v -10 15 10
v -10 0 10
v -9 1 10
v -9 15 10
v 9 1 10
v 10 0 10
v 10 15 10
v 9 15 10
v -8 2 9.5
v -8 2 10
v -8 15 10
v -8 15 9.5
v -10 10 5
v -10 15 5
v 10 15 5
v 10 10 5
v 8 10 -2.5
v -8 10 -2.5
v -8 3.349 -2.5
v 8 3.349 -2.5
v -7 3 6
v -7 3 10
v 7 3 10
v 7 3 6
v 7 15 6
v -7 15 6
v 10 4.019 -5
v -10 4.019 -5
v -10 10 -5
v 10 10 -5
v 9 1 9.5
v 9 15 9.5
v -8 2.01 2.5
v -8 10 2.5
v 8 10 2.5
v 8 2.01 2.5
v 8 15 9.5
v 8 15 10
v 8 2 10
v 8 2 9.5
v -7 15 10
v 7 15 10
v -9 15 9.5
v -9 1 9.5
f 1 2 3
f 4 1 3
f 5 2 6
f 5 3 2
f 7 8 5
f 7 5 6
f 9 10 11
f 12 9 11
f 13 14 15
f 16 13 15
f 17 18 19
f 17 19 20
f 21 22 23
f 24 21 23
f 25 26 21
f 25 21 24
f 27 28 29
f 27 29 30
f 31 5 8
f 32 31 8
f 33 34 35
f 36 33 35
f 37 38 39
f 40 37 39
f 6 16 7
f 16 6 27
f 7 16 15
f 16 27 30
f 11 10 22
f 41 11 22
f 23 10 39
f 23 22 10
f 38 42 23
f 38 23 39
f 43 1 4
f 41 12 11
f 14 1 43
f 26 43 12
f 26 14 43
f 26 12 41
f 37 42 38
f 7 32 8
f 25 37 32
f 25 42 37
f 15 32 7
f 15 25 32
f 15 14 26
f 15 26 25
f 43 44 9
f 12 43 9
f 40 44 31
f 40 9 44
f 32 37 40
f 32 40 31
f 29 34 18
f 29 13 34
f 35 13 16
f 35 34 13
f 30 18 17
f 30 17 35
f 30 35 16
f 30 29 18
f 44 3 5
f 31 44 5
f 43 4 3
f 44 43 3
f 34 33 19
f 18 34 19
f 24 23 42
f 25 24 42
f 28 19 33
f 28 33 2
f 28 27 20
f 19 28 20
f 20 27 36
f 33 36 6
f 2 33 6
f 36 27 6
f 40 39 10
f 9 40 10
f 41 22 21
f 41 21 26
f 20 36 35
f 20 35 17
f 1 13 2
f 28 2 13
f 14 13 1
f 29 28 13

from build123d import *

# Parameters (mm, degrees)
SKETCH1_W           = 20
SKETCH1_H           = 10
BOSS_EXTRUDE1_DEPTH = 10
SKETCH2_W           = 16
SKETCH2_H           = 5
CUT_EXTRUDE1_DEPTH  = 11
SKETCH3_W           = 20
SKETCH3_H           = 15
BOSS_EXTRUDE2_DEPTH = 5
SKETCH4_W           = 14
SKETCH4_H           = 12
CUT_EXTRUDE2_DEPTH  = 4
CUT_EXTRUDE3_DEPTH  = 0.5
CUT_EXTRUDE4_DEPTH  = 21


with BuildPart() as part:
    # Sketch1 → Boss-Extrude1 (new body)
    with BuildSketch(Plane(origin=(0, 0, 0), x_dir=(1, 0, 0), z_dir=(0, 1, 0))):
        Rectangle(SKETCH1_W, SKETCH1_H)
    extrude(amount=BOSS_EXTRUDE1_DEPTH)

    # Sketch2 → Cut-Extrude1 (cut, through all)
    with BuildSketch(Plane(origin=(0, 10, 0), x_dir=(1, 0, 0), z_dir=(0, 1, 0))):
        Rectangle(SKETCH2_W, SKETCH2_H)
    extrude(amount=-CUT_EXTRUDE1_DEPTH, mode=Mode.SUBTRACT)

    # Sketch3 → Boss-Extrude2 (add)
    with BuildSketch(Plane.XY.offset(5)):
        with Locations((0, 7.5)):
            Rectangle(SKETCH3_W, SKETCH3_H)
    extrude(amount=BOSS_EXTRUDE2_DEPTH)

    # Sketch4 → Cut-Extrude2 (cut)
    with BuildSketch(Plane.XY.offset(10)):
        with Locations((0, 9)):
            Rectangle(SKETCH4_W, SKETCH4_H)
    extrude(amount=-CUT_EXTRUDE2_DEPTH, mode=Mode.SUBTRACT)

    # Sketch5 → Cut-Extrude3 (cut)
    with BuildSketch(Plane.XY.offset(10)):
        Polygon((-9, 15), (-9, 1), (0, 1), (9, 1), (9, 15), (8, 15), (8, 2), (0, 2), (-8, 2), (-8, 15), align=None)
    extrude(amount=-CUT_EXTRUDE3_DEPTH, mode=Mode.SUBTRACT)

    # Sketch7 → Cut-Extrude4 (cut, through all)
    with BuildSketch(Plane(origin=(10, 0, 0), x_dir=(0, 0, -1), z_dir=(1, 0, 0))):
        Polygon((5, 4.019237886), (-10, 0), (5, 0), align=None)
    extrude(amount=-CUT_EXTRUDE4_DEPTH, mode=Mode.SUBTRACT)


solid = part.part
